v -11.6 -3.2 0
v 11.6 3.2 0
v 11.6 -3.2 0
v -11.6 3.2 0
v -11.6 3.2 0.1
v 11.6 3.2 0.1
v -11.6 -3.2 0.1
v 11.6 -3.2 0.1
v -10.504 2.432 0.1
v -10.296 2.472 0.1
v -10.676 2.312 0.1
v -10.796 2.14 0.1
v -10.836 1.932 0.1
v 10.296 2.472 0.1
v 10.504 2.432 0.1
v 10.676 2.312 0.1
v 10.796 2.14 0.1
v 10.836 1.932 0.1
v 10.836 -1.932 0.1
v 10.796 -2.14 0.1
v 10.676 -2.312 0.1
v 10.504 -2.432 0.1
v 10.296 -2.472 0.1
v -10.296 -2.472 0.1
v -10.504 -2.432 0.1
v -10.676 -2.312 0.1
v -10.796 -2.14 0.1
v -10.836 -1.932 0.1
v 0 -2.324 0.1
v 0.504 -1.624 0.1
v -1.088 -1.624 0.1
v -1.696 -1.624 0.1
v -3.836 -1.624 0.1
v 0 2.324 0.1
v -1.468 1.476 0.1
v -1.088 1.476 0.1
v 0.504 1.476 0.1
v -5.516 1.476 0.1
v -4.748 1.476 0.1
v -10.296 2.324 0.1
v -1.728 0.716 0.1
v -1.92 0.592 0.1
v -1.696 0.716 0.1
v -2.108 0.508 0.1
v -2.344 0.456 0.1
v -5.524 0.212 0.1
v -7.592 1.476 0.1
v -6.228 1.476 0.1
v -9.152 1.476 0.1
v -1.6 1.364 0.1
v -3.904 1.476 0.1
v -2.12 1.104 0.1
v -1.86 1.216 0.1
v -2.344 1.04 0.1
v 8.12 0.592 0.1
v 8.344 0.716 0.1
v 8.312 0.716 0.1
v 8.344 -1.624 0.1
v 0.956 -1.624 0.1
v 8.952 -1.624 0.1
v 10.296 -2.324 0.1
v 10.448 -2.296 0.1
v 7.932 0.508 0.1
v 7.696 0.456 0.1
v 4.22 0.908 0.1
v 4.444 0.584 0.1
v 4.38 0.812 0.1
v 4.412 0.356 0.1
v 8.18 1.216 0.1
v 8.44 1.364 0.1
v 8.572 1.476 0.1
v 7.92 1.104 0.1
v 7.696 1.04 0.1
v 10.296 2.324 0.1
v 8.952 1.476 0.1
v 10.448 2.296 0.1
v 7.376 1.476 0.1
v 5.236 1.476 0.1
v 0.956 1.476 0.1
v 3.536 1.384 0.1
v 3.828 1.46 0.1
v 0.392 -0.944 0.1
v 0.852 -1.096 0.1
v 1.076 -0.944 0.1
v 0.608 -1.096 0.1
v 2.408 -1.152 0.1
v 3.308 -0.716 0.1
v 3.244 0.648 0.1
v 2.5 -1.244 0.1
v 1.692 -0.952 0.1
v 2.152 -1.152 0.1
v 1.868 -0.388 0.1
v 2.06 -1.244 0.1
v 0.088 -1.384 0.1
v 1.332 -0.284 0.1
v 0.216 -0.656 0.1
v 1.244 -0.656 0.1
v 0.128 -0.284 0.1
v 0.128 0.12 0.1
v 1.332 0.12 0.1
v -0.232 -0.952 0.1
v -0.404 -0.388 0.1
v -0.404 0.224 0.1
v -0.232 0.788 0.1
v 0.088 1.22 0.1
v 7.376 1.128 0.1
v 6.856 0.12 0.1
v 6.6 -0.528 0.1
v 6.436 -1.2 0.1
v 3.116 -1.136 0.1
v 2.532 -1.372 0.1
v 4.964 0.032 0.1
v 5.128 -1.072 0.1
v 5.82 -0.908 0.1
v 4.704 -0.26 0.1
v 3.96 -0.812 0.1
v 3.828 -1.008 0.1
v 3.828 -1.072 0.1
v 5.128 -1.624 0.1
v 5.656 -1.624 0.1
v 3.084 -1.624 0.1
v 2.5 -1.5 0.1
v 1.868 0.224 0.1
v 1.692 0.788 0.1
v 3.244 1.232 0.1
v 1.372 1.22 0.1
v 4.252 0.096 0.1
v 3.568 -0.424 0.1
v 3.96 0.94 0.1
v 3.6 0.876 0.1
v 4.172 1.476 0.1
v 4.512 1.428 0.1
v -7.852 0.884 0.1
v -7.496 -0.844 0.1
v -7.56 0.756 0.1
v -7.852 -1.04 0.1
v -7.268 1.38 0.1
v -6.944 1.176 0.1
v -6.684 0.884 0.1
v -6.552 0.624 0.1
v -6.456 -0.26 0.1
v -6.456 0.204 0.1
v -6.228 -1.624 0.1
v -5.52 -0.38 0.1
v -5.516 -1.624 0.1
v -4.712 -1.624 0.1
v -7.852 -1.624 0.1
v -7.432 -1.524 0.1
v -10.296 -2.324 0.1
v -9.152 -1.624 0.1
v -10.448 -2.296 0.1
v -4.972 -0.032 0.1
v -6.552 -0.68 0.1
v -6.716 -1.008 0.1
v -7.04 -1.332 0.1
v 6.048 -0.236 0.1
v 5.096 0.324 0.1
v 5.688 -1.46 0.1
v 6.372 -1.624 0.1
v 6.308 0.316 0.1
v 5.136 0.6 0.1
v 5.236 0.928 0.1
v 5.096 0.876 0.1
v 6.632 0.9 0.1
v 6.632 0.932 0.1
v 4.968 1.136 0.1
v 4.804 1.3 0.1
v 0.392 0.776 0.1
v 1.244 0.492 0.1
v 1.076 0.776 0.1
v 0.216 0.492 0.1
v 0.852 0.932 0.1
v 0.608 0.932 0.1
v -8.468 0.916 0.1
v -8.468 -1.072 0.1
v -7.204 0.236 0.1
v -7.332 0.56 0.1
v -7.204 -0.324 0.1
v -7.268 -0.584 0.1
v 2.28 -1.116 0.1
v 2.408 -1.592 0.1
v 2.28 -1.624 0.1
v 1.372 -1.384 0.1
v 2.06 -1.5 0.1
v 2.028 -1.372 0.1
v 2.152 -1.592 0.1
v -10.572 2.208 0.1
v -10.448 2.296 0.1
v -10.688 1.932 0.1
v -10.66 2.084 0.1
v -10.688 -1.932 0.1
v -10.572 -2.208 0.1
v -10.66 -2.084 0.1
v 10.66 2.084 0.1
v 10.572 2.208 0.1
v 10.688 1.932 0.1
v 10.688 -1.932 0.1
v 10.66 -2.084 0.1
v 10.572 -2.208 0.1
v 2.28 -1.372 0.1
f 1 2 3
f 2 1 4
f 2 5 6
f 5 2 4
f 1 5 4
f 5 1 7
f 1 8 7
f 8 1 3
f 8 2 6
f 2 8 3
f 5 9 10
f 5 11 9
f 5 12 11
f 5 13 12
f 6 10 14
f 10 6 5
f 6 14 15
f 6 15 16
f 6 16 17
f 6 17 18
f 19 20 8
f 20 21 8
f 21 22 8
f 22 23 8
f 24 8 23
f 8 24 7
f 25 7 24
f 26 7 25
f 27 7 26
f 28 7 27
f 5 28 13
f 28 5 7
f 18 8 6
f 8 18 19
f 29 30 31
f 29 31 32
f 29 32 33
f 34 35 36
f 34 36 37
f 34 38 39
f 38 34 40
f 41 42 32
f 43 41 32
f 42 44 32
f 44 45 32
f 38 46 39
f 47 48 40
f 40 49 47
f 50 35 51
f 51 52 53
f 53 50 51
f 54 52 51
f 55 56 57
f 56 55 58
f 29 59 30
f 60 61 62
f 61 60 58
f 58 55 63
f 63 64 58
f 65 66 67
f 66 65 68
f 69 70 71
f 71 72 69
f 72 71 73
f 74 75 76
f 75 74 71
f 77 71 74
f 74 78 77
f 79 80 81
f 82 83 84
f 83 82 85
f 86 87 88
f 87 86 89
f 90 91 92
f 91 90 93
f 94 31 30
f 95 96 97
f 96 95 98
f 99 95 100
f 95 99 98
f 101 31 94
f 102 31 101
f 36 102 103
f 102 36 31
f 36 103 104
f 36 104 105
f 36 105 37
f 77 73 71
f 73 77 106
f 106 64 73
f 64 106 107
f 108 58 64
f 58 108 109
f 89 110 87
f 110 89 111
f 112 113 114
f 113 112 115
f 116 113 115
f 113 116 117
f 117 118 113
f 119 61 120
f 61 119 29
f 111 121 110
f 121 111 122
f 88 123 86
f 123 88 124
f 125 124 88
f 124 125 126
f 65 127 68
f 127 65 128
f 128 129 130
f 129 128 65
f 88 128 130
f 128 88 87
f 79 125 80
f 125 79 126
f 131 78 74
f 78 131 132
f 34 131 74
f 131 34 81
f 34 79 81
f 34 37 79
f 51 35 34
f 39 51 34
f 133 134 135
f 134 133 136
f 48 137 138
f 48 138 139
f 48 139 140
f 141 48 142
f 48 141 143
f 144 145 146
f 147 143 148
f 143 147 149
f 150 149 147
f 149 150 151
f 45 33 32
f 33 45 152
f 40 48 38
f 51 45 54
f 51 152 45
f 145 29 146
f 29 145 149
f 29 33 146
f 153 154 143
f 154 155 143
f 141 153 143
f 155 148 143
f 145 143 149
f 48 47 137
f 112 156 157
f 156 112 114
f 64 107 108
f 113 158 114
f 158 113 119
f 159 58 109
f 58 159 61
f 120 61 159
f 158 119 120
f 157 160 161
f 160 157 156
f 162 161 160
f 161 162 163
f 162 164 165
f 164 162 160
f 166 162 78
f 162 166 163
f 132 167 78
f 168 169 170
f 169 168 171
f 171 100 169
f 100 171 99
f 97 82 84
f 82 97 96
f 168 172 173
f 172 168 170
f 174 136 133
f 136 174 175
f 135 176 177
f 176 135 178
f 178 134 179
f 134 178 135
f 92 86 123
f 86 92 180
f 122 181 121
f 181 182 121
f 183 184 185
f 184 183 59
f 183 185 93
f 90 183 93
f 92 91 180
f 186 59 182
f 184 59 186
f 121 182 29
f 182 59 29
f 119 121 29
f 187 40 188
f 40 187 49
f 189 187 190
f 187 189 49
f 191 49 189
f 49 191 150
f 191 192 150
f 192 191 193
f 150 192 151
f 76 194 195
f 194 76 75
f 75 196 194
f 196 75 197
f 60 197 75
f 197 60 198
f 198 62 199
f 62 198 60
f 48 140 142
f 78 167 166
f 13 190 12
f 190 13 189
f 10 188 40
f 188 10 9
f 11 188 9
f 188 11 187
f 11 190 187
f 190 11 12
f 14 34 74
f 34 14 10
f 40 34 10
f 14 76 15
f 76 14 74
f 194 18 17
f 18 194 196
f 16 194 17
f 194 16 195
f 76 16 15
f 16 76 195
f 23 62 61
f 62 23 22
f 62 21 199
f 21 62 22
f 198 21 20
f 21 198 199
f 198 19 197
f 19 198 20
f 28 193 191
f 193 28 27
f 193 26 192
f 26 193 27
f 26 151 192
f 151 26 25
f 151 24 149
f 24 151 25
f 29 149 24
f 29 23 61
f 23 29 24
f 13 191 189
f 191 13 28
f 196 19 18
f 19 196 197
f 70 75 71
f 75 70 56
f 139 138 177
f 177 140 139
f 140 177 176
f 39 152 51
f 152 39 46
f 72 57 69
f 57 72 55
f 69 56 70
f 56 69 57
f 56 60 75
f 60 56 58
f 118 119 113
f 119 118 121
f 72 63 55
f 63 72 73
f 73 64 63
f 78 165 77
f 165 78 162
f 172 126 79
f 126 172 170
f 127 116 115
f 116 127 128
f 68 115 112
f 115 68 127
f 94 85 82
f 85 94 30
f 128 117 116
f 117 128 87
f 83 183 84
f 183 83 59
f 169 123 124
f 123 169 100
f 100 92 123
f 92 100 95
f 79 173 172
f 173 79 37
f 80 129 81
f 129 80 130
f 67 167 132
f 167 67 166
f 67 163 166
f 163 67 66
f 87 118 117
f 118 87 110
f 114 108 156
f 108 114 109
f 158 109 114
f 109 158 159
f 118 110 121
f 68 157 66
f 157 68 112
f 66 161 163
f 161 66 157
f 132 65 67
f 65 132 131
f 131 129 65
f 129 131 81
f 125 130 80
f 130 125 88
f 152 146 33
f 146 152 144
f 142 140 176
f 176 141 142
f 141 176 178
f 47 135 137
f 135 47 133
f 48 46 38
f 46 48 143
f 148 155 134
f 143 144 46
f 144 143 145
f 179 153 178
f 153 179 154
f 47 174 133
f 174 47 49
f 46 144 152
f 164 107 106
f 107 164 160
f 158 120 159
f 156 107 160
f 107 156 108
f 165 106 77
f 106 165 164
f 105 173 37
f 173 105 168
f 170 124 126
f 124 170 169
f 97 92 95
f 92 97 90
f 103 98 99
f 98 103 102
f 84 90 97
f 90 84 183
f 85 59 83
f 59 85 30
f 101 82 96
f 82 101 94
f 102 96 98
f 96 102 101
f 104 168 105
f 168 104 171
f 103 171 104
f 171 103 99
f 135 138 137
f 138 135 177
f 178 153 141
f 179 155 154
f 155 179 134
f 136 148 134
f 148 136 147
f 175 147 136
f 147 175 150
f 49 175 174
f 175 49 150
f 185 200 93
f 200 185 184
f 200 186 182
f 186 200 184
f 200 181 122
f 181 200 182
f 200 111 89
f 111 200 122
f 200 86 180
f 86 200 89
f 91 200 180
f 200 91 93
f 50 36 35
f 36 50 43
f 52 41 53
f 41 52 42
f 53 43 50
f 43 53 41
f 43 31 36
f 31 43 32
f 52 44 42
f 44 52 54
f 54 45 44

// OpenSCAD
// file: ../p/box5-12.scad
use <../lib.scad>
function ldraw_lib__box5_12() = [
// 0 Box with 5 Faces without Any Edges
// 0 Name: box5-12.dat
// 0 Author: Chris Dee [cwdee]
// 0 !LDRAW_ORG Primitive UPDATE 2009-02
// 0 !LICENSE Licensed under CC BY 2.0 and CC BY 4.0 : see CAreadme.txt
// 
// 0 BFC CERTIFY CCW
  [0,"BFC","CERTIFY"],
  [0,"BFC","CCW"],
// 
// 0 !HISTORY 2009-09-03 [PTadmin] Official Update 2009-02
// 
// 
// 4 16 1 1 1 1 1 -1 -1 1 -1 -1 1 1
  [4,16,1,1,1,1,1,-1,-1,1,-1,-1,1,1],
// 4 16 -1 0 1 1 0 1 1 1 1 -1 1 1
  [4,16,-1,0,1,1,0,1,1,1,1,-1,1,1],
// 4 16 -1 0 -1 -1 0 1 -1 1 1 -1 1 -1
  [4,16,-1,0,-1,-1,0,1,-1,1,1,-1,1,-1],
// 4 16 1 0 -1 -1 0 -1 -1 1 -1 1 1 -1
  [4,16,1,0,-1,-1,0,-1,-1,1,-1,1,1,-1],
// 4 16 1 0 1 1 0 -1 1 1 -1 1 1 1
  [4,16,1,0,1,1,0,-1,1,1,-1,1,1,1],
// 0
];
makepoly(ldraw_lib__box5_12(), line=0.2);
// main file
use <../lib.scad>
use <../p/box5-12.scad>
function ldraw_lib__6296256j() = [
// 0 Sticker  0.8 x  2.9 with "DK 10.271" Licence Plate
// 0 Name: 6296256j.dat
// 0 Author: Magnus Forsberg [MagFors]
// 0 !LDRAW_ORG Part UPDATE 2020-03
// 0 !LICENSE Licensed under CC BY 2.0 and CC BY 4.0 : see CAreadme.txt
// 
// 0 BFC CERTIFY CCW
  [0,"BFC","CERTIFY"],
  [0,"BFC","CCW"],
// 
// 0 !KEYWORDS 500, Cinquecento, FIAT, Nuova, set 10271
// 
// 0 !HISTORY 2020-12-29 [PTadmin] Official Update 2020-03
// 
// 
// 1 16 0 -.25 0 29 0 0 0 .25 0 0 0 8 box5-12.dat
  [1,16,0,-.25,0,29,0,0,0,.25,0,0,0,8, ldraw_lib__box5_12()],
// 3 0 -29 -.25 8 -26.26 -.25 6.08 -25.74 -.25 6.18
  [3,0,-29,-.25,8,-26.26,-.25,6.08,-25.74,-.25,6.18],
// 3 0 -29 -.25 8 -26.69 -.25 5.78 -26.26 -.25 6.08
  [3,0,-29,-.25,8,-26.69,-.25,5.78,-26.26,-.25,6.08],
// 3 0 -29 -.25 8 -26.99 -.25 5.35 -26.69 -.25 5.78
  [3,0,-29,-.25,8,-26.99,-.25,5.35,-26.69,-.25,5.78],
// 3 0 -29 -.25 8 -27.09 -.25 4.83 -26.99 -.25 5.35
  [3,0,-29,-.25,8,-27.09,-.25,4.83,-26.99,-.25,5.35],
// 4 0 25.74 -.25 6.18 29 -.25 8 -29 -.25 8 -25.74 -.25 6.18
  [4,0,25.74,-.25,6.18,29,-.25,8,-29,-.25,8,-25.74,-.25,6.18],
// 3 0 29 -.25 8 25.74 -.25 6.18 26.26 -.25 6.08
  [3,0,29,-.25,8,25.74,-.25,6.18,26.26,-.25,6.08],
// 3 0 29 -.25 8 26.26 -.25 6.08 26.69 -.25 5.78
  [3,0,29,-.25,8,26.26,-.25,6.08,26.69,-.25,5.78],
// 3 0 29 -.25 8 26.69 -.25 5.78 26.99 -.25 5.35
  [3,0,29,-.25,8,26.69,-.25,5.78,26.99,-.25,5.35],
// 3 0 29 -.25 8 26.99 -.25 5.35 27.09 -.25 4.83
  [3,0,29,-.25,8,26.99,-.25,5.35,27.09,-.25,4.83],
// 3 0 27.09 -.25 -4.83 26.99 -.25 -5.35 29 -.25 -8
  [3,0,27.09,-.25,-4.83,26.99,-.25,-5.35,29,-.25,-8],
// 3 0 26.99 -.25 -5.35 26.69 -.25 -5.78 29 -.25 -8
  [3,0,26.99,-.25,-5.35,26.69,-.25,-5.78,29,-.25,-8],
// 3 0 26.69 -.25 -5.78 26.26 -.25 -6.08 29 -.25 -8
  [3,0,26.69,-.25,-5.78,26.26,-.25,-6.08,29,-.25,-8],
// 3 0 26.26 -.25 -6.08 25.74 -.25 -6.18 29 -.25 -8
  [3,0,26.26,-.25,-6.08,25.74,-.25,-6.18,29,-.25,-8],
// 4 0 -29 -.25 -8 29 -.25 -8 25.74 -.25 -6.18 -25.74 -.25 -6.18
  [4,0,-29,-.25,-8,29,-.25,-8,25.74,-.25,-6.18,-25.74,-.25,-6.18],
// 3 0 -26.26 -.25 -6.08 -29 -.25 -8 -25.74 -.25 -6.18
  [3,0,-26.26,-.25,-6.08,-29,-.25,-8,-25.74,-.25,-6.18],
// 3 0 -26.69 -.25 -5.78 -29 -.25 -8 -26.26 -.25 -6.08
  [3,0,-26.69,-.25,-5.78,-29,-.25,-8,-26.26,-.25,-6.08],
// 3 0 -26.99 -.25 -5.35 -29 -.25 -8 -26.69 -.25 -5.78
  [3,0,-26.99,-.25,-5.35,-29,-.25,-8,-26.69,-.25,-5.78],
// 3 0 -27.09 -.25 -4.83 -29 -.25 -8 -26.99 -.25 -5.35
  [3,0,-27.09,-.25,-4.83,-29,-.25,-8,-26.99,-.25,-5.35],
// 4 0 -27.09 -.25 -4.83 -27.09 -.25 4.83 -29 -.25 8 -29 -.25 -8
  [4,0,-27.09,-.25,-4.83,-27.09,-.25,4.83,-29,-.25,8,-29,-.25,-8],
// 4 0 27.09 -.25 4.83 27.09 -.25 -4.83 29 -.25 -8 29 -.25 8
  [4,0,27.09,-.25,4.83,27.09,-.25,-4.83,29,-.25,-8,29,-.25,8],
// 3 0 0 -.25 -5.81 1.26 -.25 -4.06 -2.72 -.25 -4.06
  [3,0,0,-.25,-5.81,1.26,-.25,-4.06,-2.72,-.25,-4.06],
// 3 0 0 -.25 -5.81 -2.72 -.25 -4.06 -4.24 -.25 -4.06
  [3,0,0,-.25,-5.81,-2.72,-.25,-4.06,-4.24,-.25,-4.06],
// 3 0 0 -.25 -5.81 -4.24 -.25 -4.06 -9.59 -.25 -4.06
  [3,0,0,-.25,-5.81,-4.24,-.25,-4.06,-9.59,-.25,-4.06],
// 3 0 0 -.25 5.81 -3.67 -.25 3.69 -2.72 -.25 3.69
  [3,0,0,-.25,5.81,-3.67,-.25,3.69,-2.72,-.25,3.69],
// 3 0 0 -.25 5.81 -2.72 -.25 3.69 1.26 -.25 3.69
  [3,0,0,-.25,5.81,-2.72,-.25,3.69,1.26,-.25,3.69],
// 4 0 -13.79 -.25 3.69 -11.87 -.25 3.69 0 -.25 5.81 -25.74 -.25 5.81
  [4,0,-13.79,-.25,3.69,-11.87,-.25,3.69,0,-.25,5.81,-25.74,-.25,5.81],
// 3 0 -4.32 -.25 1.79 -4.8 -.25 1.48 -4.24 -.25 -4.06
  [3,0,-4.32,-.25,1.79,-4.8,-.25,1.48,-4.24,-.25,-4.06],
// 3 0 -4.24 -.25 1.79 -4.32 -.25 1.79 -4.24 -.25 -4.06
  [3,0,-4.24,-.25,1.79,-4.32,-.25,1.79,-4.24,-.25,-4.06],
// 3 0 -4.8 -.25 1.48 -5.27 -.25 1.27 -4.24 -.25 -4.06
  [3,0,-4.8,-.25,1.48,-5.27,-.25,1.27,-4.24,-.25,-4.06],
// 3 0 -5.27 -.25 1.27 -5.86 -.25 1.14 -4.24 -.25 -4.06
  [3,0,-5.27,-.25,1.27,-5.86,-.25,1.14,-4.24,-.25,-4.06],
// 3 0 -13.79 -.25 3.69 -13.81 -.25 .53 -11.87 -.25 3.69
  [3,0,-13.79,-.25,3.69,-13.81,-.25,.53,-11.87,-.25,3.69],
// 3 0 -18.98 -.25 3.69 -15.57 -.25 3.69 -25.74 -.25 5.81
  [3,0,-18.98,-.25,3.69,-15.57,-.25,3.69,-25.74,-.25,5.81],
// 3 0 -25.74 -.25 5.81 -22.88 -.25 3.69 -18.98 -.25 3.69
  [3,0,-25.74,-.25,5.81,-22.88,-.25,3.69,-18.98,-.25,3.69],
// 3 0 -4 -.25 3.41 -3.67 -.25 3.69 -9.76 -.25 3.69
  [3,0,-4,-.25,3.41,-3.67,-.25,3.69,-9.76,-.25,3.69],
// 3 0 -9.76 -.25 3.69 -5.3 -.25 2.76 -4.65 -.25 3.04
  [3,0,-9.76,-.25,3.69,-5.3,-.25,2.76,-4.65,-.25,3.04],
// 3 0 -4.65 -.25 3.04 -4 -.25 3.41 -9.76 -.25 3.69
  [3,0,-4.65,-.25,3.04,-4,-.25,3.41,-9.76,-.25,3.69],
// 3 0 -5.86 -.25 2.6 -5.3 -.25 2.76 -9.76 -.25 3.69
  [3,0,-5.86,-.25,2.6,-5.3,-.25,2.76,-9.76,-.25,3.69],
// 4 0 20.3 -.25 1.48 20.86 -.25 -4.06 20.86 -.25 1.79 20.78 -.25 1.79
  [4,0,20.3,-.25,1.48,20.86,-.25,-4.06,20.86,-.25,1.79,20.78,-.25,1.79],
// 3 0 0 -.25 -5.81 2.39 -.25 -4.06 1.26 -.25 -4.06
  [3,0,0,-.25,-5.81,2.39,-.25,-4.06,1.26,-.25,-4.06],
// 4 0 22.38 -.25 -4.06 20.86 -.25 -4.06 25.74 -.25 -5.81 26.12 -.25 -5.74
  [4,0,22.38,-.25,-4.06,20.86,-.25,-4.06,25.74,-.25,-5.81,26.12,-.25,-5.74],
// 3 0 20.86 -.25 -4.06 20.3 -.25 1.48 19.83 -.25 1.27
  [3,0,20.86,-.25,-4.06,20.3,-.25,1.48,19.83,-.25,1.27],
// 3 0 19.83 -.25 1.27 19.24 -.25 1.14 20.86 -.25 -4.06
  [3,0,19.83,-.25,1.27,19.24,-.25,1.14,20.86,-.25,-4.06],
// 4 0 11.11 -.25 1.46 10.95 -.25 2.03 10.55 -.25 2.27 11.03 -.25 .89
  [4,0,11.11,-.25,1.46,10.95,-.25,2.03,10.55,-.25,2.27,11.03,-.25,.89],
// 3 0 20.45 -.25 3.04 21.1 -.25 3.41 21.43 -.25 3.69
  [3,0,20.45,-.25,3.04,21.1,-.25,3.41,21.43,-.25,3.69],
// 4 0 21.43 -.25 3.69 19.24 -.25 2.6 19.8 -.25 2.76 20.45 -.25 3.04
  [4,0,21.43,-.25,3.69,19.24,-.25,2.6,19.8,-.25,2.76,20.45,-.25,3.04],
// 4 0 25.74 -.25 5.81 21.43 -.25 3.69 22.38 -.25 3.69 26.12 -.25 5.74
  [4,0,25.74,-.25,5.81,21.43,-.25,3.69,22.38,-.25,3.69,26.12,-.25,5.74],
// 3 0 18.44 -.25 3.69 21.43 -.25 3.69 25.74 -.25 5.81
  [3,0,18.44,-.25,3.69,21.43,-.25,3.69,25.74,-.25,5.81],
// 3 0 25.74 -.25 5.81 13.09 -.25 3.69 18.44 -.25 3.69
  [3,0,25.74,-.25,5.81,13.09,-.25,3.69,18.44,-.25,3.69],
// 3 0 2.39 -.25 3.69 8.84 -.25 3.46 9.57 -.25 3.65
  [3,0,2.39,-.25,3.69,8.84,-.25,3.46,9.57,-.25,3.65],
// 4 0 1.52 -.25 -2.74 2.13 -.25 -2.74 2.69 -.25 -2.36 .98 -.25 -2.36
  [4,0,1.52,-.25,-2.74,2.13,-.25,-2.74,2.69,-.25,-2.36,.98,-.25,-2.36],
// 4 0 8.27 -.25 -1.79 8.11 -.25 1.62 6.02 -.25 -2.88 6.25 -.25 -3.11
  [4,0,8.27,-.25,-1.79,8.11,-.25,1.62,6.02,-.25,-2.88,6.25,-.25,-3.11],
// 4 0 5.38 -.25 -2.88 4.67 -.25 -.97 4.23 -.25 -2.38 5.15 -.25 -3.11
  [4,0,5.38,-.25,-2.88,4.67,-.25,-.97,4.23,-.25,-2.38,5.15,-.25,-3.11],
// 3 0 .22 -.25 -3.46 -2.72 -.25 -4.06 1.26 -.25 -4.06
  [3,0,.22,-.25,-3.46,-2.72,-.25,-4.06,1.26,-.25,-4.06],
// 4 0 3.11 -.25 -1.64 3.33 -.25 -.71 .32 -.25 -.71 .54 -.25 -1.64
  [4,0,3.11,-.25,-1.64,3.33,-.25,-.71,.32,-.25,-.71,.54,-.25,-1.64],
// 4 0 .32 -.25 .3 .32 -.25 -.71 3.33 -.25 -.71 3.33 -.25 .3
  [4,0,.32,-.25,.3,.32,-.25,-.71,3.33,-.25,-.71,3.33,-.25,.3],
// 3 0 -.58 -.25 -2.38 -2.72 -.25 -4.06 .22 -.25 -3.46
  [3,0,-.58,-.25,-2.38,-2.72,-.25,-4.06,.22,-.25,-3.46],
// 3 0 -1.01 -.25 -.97 -2.72 -.25 -4.06 -.58 -.25 -2.38
  [3,0,-1.01,-.25,-.97,-2.72,-.25,-4.06,-.58,-.25,-2.38],
// 4 0 -1.01 -.25 .56 -2.72 -.25 3.69 -2.72 -.25 -4.06 -1.01 -.25 -.97
  [4,0,-1.01,-.25,.56,-2.72,-.25,3.69,-2.72,-.25,-4.06,-1.01,-.25,-.97],
// 3 0 -2.72 -.25 3.69 -1.01 -.25 .56 -.58 -.25 1.97
  [3,0,-2.72,-.25,3.69,-1.01,-.25,.56,-.58,-.25,1.97],
// 3 0 -2.72 -.25 3.69 -.58 -.25 1.97 .22 -.25 3.05
  [3,0,-2.72,-.25,3.69,-.58,-.25,1.97,.22,-.25,3.05],
// 3 0 -2.72 -.25 3.69 .22 -.25 3.05 1.26 -.25 3.69
  [3,0,-2.72,-.25,3.69,.22,-.25,3.05,1.26,-.25,3.69],
// 4 0 18.44 -.25 3.69 18.44 -.25 2.82 19.24 -.25 2.6 21.43 -.25 3.69
  [4,0,18.44,-.25,3.69,18.44,-.25,2.82,19.24,-.25,2.6,21.43,-.25,3.69],
// 4 0 18.44 -.25 2.82 17.14 -.25 .3 19.24 -.25 1.14 19.24 -.25 2.6
  [4,0,18.44,-.25,2.82,17.14,-.25,.3,19.24,-.25,1.14,19.24,-.25,2.6],
// 4 0 16.5 -.25 -1.32 16.09 -.25 -3 20.86 -.25 -4.06 19.24 -.25 1.14
  [4,0,16.5,-.25,-1.32,16.09,-.25,-3,20.86,-.25,-4.06,19.24,-.25,1.14],
// 4 0 7.79 -.25 -2.84 8.27 -.25 -1.79 6.25 -.25 -3.11 6.33 -.25 -3.43
  [4,0,7.79,-.25,-2.84,8.27,-.25,-1.79,6.25,-.25,-3.11,6.33,-.25,-3.43],
// 4 0 12.41 -.25 .08 11.76 -.25 -.65 12.82 -.25 -2.68 14.55 -.25 -2.27
  [4,0,12.41,-.25,.08,11.76,-.25,-.65,12.82,-.25,-2.68,14.55,-.25,-2.27],
// 4 0 12.82 -.25 -2.68 11.76 -.25 -.65 9.9 -.25 -2.03 9.57 -.25 -2.52
  [4,0,12.82,-.25,-2.68,11.76,-.25,-.65,9.9,-.25,-2.03,9.57,-.25,-2.52],
// 3 0 9.57 -.25 -2.52 9.57 -.25 -2.68 12.82 -.25 -2.68
  [3,0,9.57,-.25,-2.52,9.57,-.25,-2.68,12.82,-.25,-2.68],
// 4 0 0 -.25 -5.81 25.74 -.25 -5.81 14.14 -.25 -4.06 12.82 -.25 -4.06
  [4,0,0,-.25,-5.81,25.74,-.25,-5.81,14.14,-.25,-4.06,12.82,-.25,-4.06],
// 4 0 7.79 -.25 -2.84 6.33 -.25 -3.43 6.25 -.25 -3.75 7.71 -.25 -4.06
  [4,0,7.79,-.25,-2.84,6.33,-.25,-3.43,6.25,-.25,-3.75,7.71,-.25,-4.06],
// 4 0 4.67 -.25 .56 6.02 -.25 -2.88 8.11 -.25 1.62 4.23 -.25 1.97
  [4,0,4.67,-.25,.56,6.02,-.25,-2.88,8.11,-.25,1.62,4.23,-.25,1.97],
// 4 0 3.43 -.25 3.05 4.23 -.25 1.97 8.11 -.25 1.62 8.11 -.25 3.08
  [4,0,3.43,-.25,3.05,4.23,-.25,1.97,8.11,-.25,1.62,8.11,-.25,3.08],
// 4 0 10.55 -.25 2.27 8.92 -.25 -1.06 10.63 -.25 .24 11.03 -.25 .89
  [4,0,10.55,-.25,2.27,8.92,-.25,-1.06,10.63,-.25,.24,11.03,-.25,.89],
// 4 0 10.55 -.25 2.27 9.9 -.25 2.35 9 -.25 2.19 8.92 -.25 -1.06
  [4,0,10.55,-.25,2.27,9.9,-.25,2.35,9,-.25,2.19,8.92,-.25,-1.06],
// 4 0 8.27 -.25 -1.79 8.92 -.25 -1.06 9 -.25 2.19 8.11 -.25 1.62
  [4,0,8.27,-.25,-1.79,8.92,-.25,-1.06,9,-.25,2.19,8.11,-.25,1.62],
// 4 0 2.39 -.25 3.69 3.43 -.25 3.05 8.11 -.25 3.08 8.84 -.25 3.46
  [4,0,2.39,-.25,3.69,3.43,-.25,3.05,8.11,-.25,3.08,8.84,-.25,3.46],
// 4 0 11.28 -.25 3.57 13.09 -.25 3.69 25.74 -.25 5.81 10.43 -.25 3.69
  [4,0,11.28,-.25,3.57,13.09,-.25,3.69,25.74,-.25,5.81,10.43,-.25,3.69],
// 4 0 10.43 -.25 3.69 25.74 -.25 5.81 0 -.25 5.81 9.57 -.25 3.65
  [4,0,10.43,-.25,3.69,25.74,-.25,5.81,0,-.25,5.81,9.57,-.25,3.65],
// 3 0 0 -.25 5.81 2.39 -.25 3.69 9.57 -.25 3.65
  [3,0,0,-.25,5.81,2.39,-.25,3.69,9.57,-.25,3.65],
// 3 0 0 -.25 5.81 1.26 -.25 3.69 2.39 -.25 3.69
  [3,0,0,-.25,5.81,1.26,-.25,3.69,2.39,-.25,3.69],
// 3 0 -9.76 -.25 3.69 -3.67 -.25 3.69 0 -.25 5.81
  [3,0,-9.76,-.25,3.69,-3.67,-.25,3.69,0,-.25,5.81],
// 3 0 -11.87 -.25 3.69 -9.76 -.25 3.69 0 -.25 5.81
  [3,0,-11.87,-.25,3.69,-9.76,-.25,3.69,0,-.25,5.81],
// 4 0 -18.74 -.25 -2.11 -18.9 -.25 1.89 -19.63 -.25 2.21 -19.63 -.25 -2.6
  [4,0,-18.74,-.25,-2.11,-18.9,-.25,1.89,-19.63,-.25,2.21,-19.63,-.25,-2.6],
// 3 0 -15.57 -.25 3.69 -18.17 -.25 3.45 -17.36 -.25 2.94
  [3,0,-15.57,-.25,3.69,-18.17,-.25,3.45,-17.36,-.25,2.94],
// 3 0 -15.57 -.25 3.69 -17.36 -.25 2.94 -16.71 -.25 2.21
  [3,0,-15.57,-.25,3.69,-17.36,-.25,2.94,-16.71,-.25,2.21],
// 3 0 -15.57 -.25 3.69 -16.71 -.25 2.21 -16.38 -.25 1.56
  [3,0,-15.57,-.25,3.69,-16.71,-.25,2.21,-16.38,-.25,1.56],
// 4 0 -16.14 -.25 .51 -16.14 -.25 -.65 -15.57 -.25 -4.06 -15.57 -.25 3.69
  [4,0,-16.14,-.25,.51,-16.14,-.25,-.65,-15.57,-.25,-4.06,-15.57,-.25,3.69],
// 3 0 -13.8 -.25 -.95 -13.79 -.25 -4.06 -11.78 -.25 -4.06
  [3,0,-13.8,-.25,-.95,-13.79,-.25,-4.06,-11.78,-.25,-4.06],
// 4 0 -15.57 -.25 -4.06 -18.58 -.25 -3.81 -19.63 -.25 -4.06 -25.74 -.25 -5.81
  [4,0,-15.57,-.25,-4.06,-18.58,-.25,-3.81,-19.63,-.25,-4.06,-25.74,-.25,-5.81],
// 4 0 -25.74 -.25 -5.81 -19.63 -.25 -4.06 -22.88 -.25 -4.06 -26.12 -.25 -5.74
  [4,0,-25.74,-.25,-5.81,-19.63,-.25,-4.06,-22.88,-.25,-4.06,-26.12,-.25,-5.74],
// 4 0 -4.24 -.25 -4.06 -5.86 -.25 1.14 -12.43 -.25 -.08 -9.59 -.25 -4.06
  [4,0,-4.24,-.25,-4.06,-5.86,-.25,1.14,-12.43,-.25,-.08,-9.59,-.25,-4.06],
// 3 0 -25.74 -.25 5.81 -15.57 -.25 3.69 -13.79 -.25 3.69
  [3,0,-25.74,-.25,5.81,-15.57,-.25,3.69,-13.79,-.25,3.69],
// 3 0 -9.76 -.25 3.69 -5.86 -.25 1.14 -5.86 -.25 2.6
  [3,0,-9.76,-.25,3.69,-5.86,-.25,1.14,-5.86,-.25,2.6],
// 3 0 -9.76 -.25 3.69 -12.43 -.25 -.08 -5.86 -.25 1.14
  [3,0,-9.76,-.25,3.69,-12.43,-.25,-.08,-5.86,-.25,1.14],
// 4 0 -13.79 -.25 -4.06 -25.74 -.25 -5.81 0 -.25 -5.81 -11.78 -.25 -4.06
  [4,0,-13.79,-.25,-4.06,-25.74,-.25,-5.81,0,-.25,-5.81,-11.78,-.25,-4.06],
// 3 0 0 -.25 -5.81 -9.59 -.25 -4.06 -11.78 -.25 -4.06
  [3,0,0,-.25,-5.81,-9.59,-.25,-4.06,-11.78,-.25,-4.06],
// 3 0 -16.38 -.25 -1.7 -16.79 -.25 -2.52 -15.57 -.25 -4.06
  [3,0,-16.38,-.25,-1.7,-16.79,-.25,-2.52,-15.57,-.25,-4.06],
// 3 0 -16.79 -.25 -2.52 -17.6 -.25 -3.33 -15.57 -.25 -4.06
  [3,0,-16.79,-.25,-2.52,-17.6,-.25,-3.33,-15.57,-.25,-4.06],
// 3 0 -16.14 -.25 -.65 -16.38 -.25 -1.7 -15.57 -.25 -4.06
  [3,0,-16.14,-.25,-.65,-16.38,-.25,-1.7,-15.57,-.25,-4.06],
// 3 0 -17.6 -.25 -3.33 -18.58 -.25 -3.81 -15.57 -.25 -4.06
  [3,0,-17.6,-.25,-3.33,-18.58,-.25,-3.81,-15.57,-.25,-4.06],
// 3 0 -13.79 -.25 -4.06 -15.57 -.25 -4.06 -25.74 -.25 -5.81
  [3,0,-13.79,-.25,-4.06,-15.57,-.25,-4.06,-25.74,-.25,-5.81],
// 3 0 -15.57 -.25 3.69 -18.98 -.25 3.69 -18.17 -.25 3.45
  [3,0,-15.57,-.25,3.69,-18.98,-.25,3.69,-18.17,-.25,3.45],
// 4 0 12.41 -.25 .08 14.55 -.25 -2.27 15.12 -.25 -.59 12.74 -.25 .81
  [4,0,12.41,-.25,.08,14.55,-.25,-2.27,15.12,-.25,-.59,12.74,-.25,.81],
// 3 0 19.24 -.25 1.14 17.14 -.25 .3 16.5 -.25 -1.32
  [3,0,19.24,-.25,1.14,17.14,-.25,.3,16.5,-.25,-1.32],
// 4 0 14.22 -.25 -3.65 14.55 -.25 -2.27 12.82 -.25 -2.68 12.82 -.25 -4.06
  [4,0,14.22,-.25,-3.65,14.55,-.25,-2.27,12.82,-.25,-2.68,12.82,-.25,-4.06],
// 4 0 20.86 -.25 -4.06 16.09 -.25 -3 15.93 -.25 -4.06 25.74 -.25 -5.81
  [4,0,20.86,-.25,-4.06,16.09,-.25,-3,15.93,-.25,-4.06,25.74,-.25,-5.81],
// 3 0 14.14 -.25 -4.06 25.74 -.25 -5.81 15.93 -.25 -4.06
  [3,0,14.14,-.25,-4.06,25.74,-.25,-5.81,15.93,-.25,-4.06],
// 3 0 14.22 -.25 -3.65 12.82 -.25 -4.06 14.14 -.25 -4.06
  [3,0,14.22,-.25,-3.65,12.82,-.25,-4.06,14.14,-.25,-4.06],
// 4 0 15.77 -.25 .79 12.84 -.25 1.5 12.74 -.25 .81 15.12 -.25 -.59
  [4,0,15.77,-.25,.79,12.84,-.25,1.5,12.74,-.25,.81,15.12,-.25,-.59],
// 4 0 13.09 -.25 2.32 12.74 -.25 2.19 12.84 -.25 1.5 15.77 -.25 .79
  [4,0,13.09,-.25,2.32,12.74,-.25,2.19,12.84,-.25,1.5,15.77,-.25,.79],
// 4 0 16.58 -.25 2.25 16.58 -.25 2.33 13.09 -.25 2.32 15.77 -.25 .79
  [4,0,16.58,-.25,2.25,16.58,-.25,2.33,13.09,-.25,2.32,15.77,-.25,.79],
// 4 0 12.42 -.25 2.84 12.74 -.25 2.19 13.09 -.25 2.32 13.09 -.25 3.69
  [4,0,12.42,-.25,2.84,12.74,-.25,2.19,13.09,-.25,2.32,13.09,-.25,3.69],
// 3 0 11.28 -.25 3.57 12.01 -.25 3.25 13.09 -.25 3.69
  [3,0,11.28,-.25,3.57,12.01,-.25,3.25,13.09,-.25,3.69],
// 4 0 .98 -.25 1.94 .54 -.25 1.23 3.11 -.25 1.23 2.69 -.25 1.94
  [4,0,.98,-.25,1.94,.54,-.25,1.23,3.11,-.25,1.23,2.69,-.25,1.94],
// 4 0 3.33 -.25 .3 3.11 -.25 1.23 .54 -.25 1.23 .32 -.25 .3
  [4,0,3.33,-.25,.3,3.11,-.25,1.23,.54,-.25,1.23,.32,-.25,.3],
// 4 0 3.11 -.25 -1.64 .54 -.25 -1.64 .98 -.25 -2.36 2.69 -.25 -2.36
  [4,0,3.11,-.25,-1.64,.54,-.25,-1.64,.98,-.25,-2.36,2.69,-.25,-2.36],
// 4 0 .98 -.25 1.94 2.69 -.25 1.94 2.13 -.25 2.33 1.52 -.25 2.33
  [4,0,.98,-.25,1.94,2.69,-.25,1.94,2.13,-.25,2.33,1.52,-.25,2.33],
// 4 0 -21.17 -.25 -2.68 -19.63 -.25 -2.6 -19.63 -.25 2.21 -21.17 -.25 2.29
  [4,0,-21.17,-.25,-2.68,-19.63,-.25,-2.6,-19.63,-.25,2.21,-21.17,-.25,2.29],
// 4 0 -18.01 -.25 .59 -18.33 -.25 1.4 -18.9 -.25 1.89 -18.01 -.25 -.81
  [4,0,-18.01,-.25,.59,-18.33,-.25,1.4,-18.9,-.25,1.89,-18.01,-.25,-.81],
// 4 0 -18.74 -.25 -2.11 -18.17 -.25 -1.46 -18.01 -.25 -.81 -18.9 -.25 1.89
  [4,0,-18.74,-.25,-2.11,-18.17,-.25,-1.46,-18.01,-.25,-.81,-18.9,-.25,1.89],
// 4 0 6.02 -.25 -2.88 4.67 -.25 .56 4.67 -.25 -.97 5.7 -.25 -2.79
  [4,0,6.02,-.25,-2.88,4.67,-.25,.56,4.67,-.25,-.97,5.7,-.25,-2.79],
// 3 0 6.25 -.25 -3.75 6.02 -.25 -3.98 7.71 -.25 -4.06
  [3,0,6.25,-.25,-3.75,6.02,-.25,-3.98,7.71,-.25,-4.06],
// 3 0 6.02 -.25 -3.98 5.7 -.25 -4.06 7.71 -.25 -4.06
  [3,0,6.02,-.25,-3.98,5.7,-.25,-4.06,7.71,-.25,-4.06],
// 4 0 3.43 -.25 -3.46 2.39 -.25 -4.06 5.15 -.25 -3.75 5.07 -.25 -3.43
  [4,0,3.43,-.25,-3.46,2.39,-.25,-4.06,5.15,-.25,-3.75,5.07,-.25,-3.43],
// 3 0 3.43 -.25 -3.46 5.07 -.25 -3.43 5.15 -.25 -3.11
  [3,0,3.43,-.25,-3.46,5.07,-.25,-3.43,5.15,-.25,-3.11],
// 3 0 4.23 -.25 -2.38 3.43 -.25 -3.46 5.15 -.25 -3.11
  [3,0,4.23,-.25,-2.38,3.43,-.25,-3.46,5.15,-.25,-3.11],
// 3 0 4.67 -.25 -.97 5.38 -.25 -2.88 5.7 -.25 -2.79
  [3,0,4.67,-.25,-.97,5.38,-.25,-2.88,5.7,-.25,-2.79],
// 3 0 5.38 -.25 -3.98 2.39 -.25 -4.06 5.7 -.25 -4.06
  [3,0,5.38,-.25,-3.98,2.39,-.25,-4.06,5.7,-.25,-4.06],
// 3 0 5.15 -.25 -3.75 2.39 -.25 -4.06 5.38 -.25 -3.98
  [3,0,5.15,-.25,-3.75,2.39,-.25,-4.06,5.38,-.25,-3.98],
// 3 0 7.71 -.25 -4.06 5.7 -.25 -4.06 0 -.25 -5.81
  [3,0,7.71,-.25,-4.06,5.7,-.25,-4.06,0,-.25,-5.81],
// 3 0 5.7 -.25 -4.06 2.39 -.25 -4.06 0 -.25 -5.81
  [3,0,5.7,-.25,-4.06,2.39,-.25,-4.06,0,-.25,-5.81],
// 3 0 12.82 -.25 -4.06 7.71 -.25 -4.06 0 -.25 -5.81
  [3,0,12.82,-.25,-4.06,7.71,-.25,-4.06,0,-.25,-5.81],
// 4 0 -22.88 -.25 3.69 -25.74 -.25 5.81 -26.12 -.25 5.74 -26.43 -.25 5.52
  [4,0,-22.88,-.25,3.69,-25.74,-.25,5.81,-26.12,-.25,5.74,-26.43,-.25,5.52],
// 4 0 -22.88 -.25 3.69 -26.43 -.25 5.52 -26.65 -.25 5.21 -26.72 -.25 4.83
  [4,0,-22.88,-.25,3.69,-26.43,-.25,5.52,-26.65,-.25,5.21,-26.72,-.25,4.83],
// 4 0 -22.88 -.25 3.69 -26.72 -.25 4.83 -26.72 -.25 -4.83 -22.88 -.25 -4.06
  [4,0,-22.88,-.25,3.69,-26.72,-.25,4.83,-26.72,-.25,-4.83,-22.88,-.25,-4.06],
// 4 0 -22.88 -.25 -4.06 -26.72 -.25 -4.83 -26.65 -.25 -5.21 -26.43 -.25 -5.52
  [4,0,-22.88,-.25,-4.06,-26.72,-.25,-4.83,-26.65,-.25,-5.21,-26.43,-.25,-5.52],
// 3 0 -22.88 -.25 -4.06 -26.43 -.25 -5.52 -26.12 -.25 -5.74
  [3,0,-22.88,-.25,-4.06,-26.43,-.25,-5.52,-26.12,-.25,-5.74],
// 4 0 26.43 -.25 5.52 26.12 -.25 5.74 22.38 -.25 3.69 26.65 -.25 5.21
  [4,0,26.43,-.25,5.52,26.12,-.25,5.74,22.38,-.25,3.69,26.65,-.25,5.21],
// 4 0 26.72 -.25 -4.83 26.72 -.25 4.83 26.65 -.25 5.21 22.38 -.25 3.69
  [4,0,26.72,-.25,-4.83,26.72,-.25,4.83,26.65,-.25,5.21,22.38,-.25,3.69],
// 4 0 26.72 -.25 -4.83 22.38 -.25 3.69 22.38 -.25 -4.06 26.65 -.25 -5.21
  [4,0,26.72,-.25,-4.83,22.38,-.25,3.69,22.38,-.25,-4.06,26.65,-.25,-5.21],
// 4 0 26.43 -.25 -5.52 26.65 -.25 -5.21 22.38 -.25 -4.06 26.12 -.25 -5.74
  [4,0,26.43,-.25,-5.52,26.65,-.25,-5.21,22.38,-.25,-4.06,26.12,-.25,-5.74],
// 3 0 -15.57 -.25 3.69 -16.38 -.25 1.56 -16.14 -.25 .51
  [3,0,-15.57,-.25,3.69,-16.38,-.25,1.56,-16.14,-.25,.51],
// 3 0 13.09 -.25 3.69 12.01 -.25 3.25 12.42 -.25 2.84
  [3,0,13.09,-.25,3.69,12.01,-.25,3.25,12.42,-.25,2.84],
// 4 15 -26.72 -.25 4.83 -26.65 -.25 5.21 -26.99 -.25 5.35 -27.09 -.25 4.83
  [4,15,-26.72,-.25,4.83,-26.65,-.25,5.21,-26.99,-.25,5.35,-27.09,-.25,4.83],
// 4 15 -26.12 -.25 5.74 -25.74 -.25 5.81 -25.74 -.25 6.18 -26.26 -.25 6.08
  [4,15,-26.12,-.25,5.74,-25.74,-.25,5.81,-25.74,-.25,6.18,-26.26,-.25,6.08],
// 4 15 -26.43 -.25 5.52 -26.12 -.25 5.74 -26.26 -.25 6.08 -26.69 -.25 5.78
  [4,15,-26.43,-.25,5.52,-26.12,-.25,5.74,-26.26,-.25,6.08,-26.69,-.25,5.78],
// 4 15 -26.65 -.25 5.21 -26.43 -.25 5.52 -26.69 -.25 5.78 -26.99 -.25 5.35
  [4,15,-26.65,-.25,5.21,-26.43,-.25,5.52,-26.69,-.25,5.78,-26.99,-.25,5.35],
// 4 15 25.74 -.25 5.81 25.74 -.25 6.18 -25.74 -.25 6.18 0 -.25 5.81
  [4,15,25.74,-.25,5.81,25.74,-.25,6.18,-25.74,-.25,6.18,0,-.25,5.81],
// 3 15 -25.74 -.25 5.81 0 -.25 5.81 -25.74 -.25 6.18
  [3,15,-25.74,-.25,5.81,0,-.25,5.81,-25.74,-.25,6.18],
// 4 15 26.12 -.25 5.74 26.26 -.25 6.08 25.74 -.25 6.18 25.74 -.25 5.81
  [4,15,26.12,-.25,5.74,26.26,-.25,6.08,25.74,-.25,6.18,25.74,-.25,5.81],
// 4 15 26.65 -.25 5.21 26.72 -.25 4.83 27.09 -.25 4.83 26.99 -.25 5.35
  [4,15,26.65,-.25,5.21,26.72,-.25,4.83,27.09,-.25,4.83,26.99,-.25,5.35],
// 4 15 26.43 -.25 5.52 26.65 -.25 5.21 26.99 -.25 5.35 26.69 -.25 5.78
  [4,15,26.43,-.25,5.52,26.65,-.25,5.21,26.99,-.25,5.35,26.69,-.25,5.78],
// 4 15 26.12 -.25 5.74 26.43 -.25 5.52 26.69 -.25 5.78 26.26 -.25 6.08
  [4,15,26.12,-.25,5.74,26.43,-.25,5.52,26.69,-.25,5.78,26.26,-.25,6.08],
// 4 15 26.12 -.25 -5.74 25.74 -.25 -5.81 25.74 -.25 -6.18 26.26 -.25 -6.08
  [4,15,26.12,-.25,-5.74,25.74,-.25,-5.81,25.74,-.25,-6.18,26.26,-.25,-6.08],
// 4 15 26.43 -.25 -5.52 26.12 -.25 -5.74 26.26 -.25 -6.08 26.69 -.25 -5.78
  [4,15,26.43,-.25,-5.52,26.12,-.25,-5.74,26.26,-.25,-6.08,26.69,-.25,-5.78],
// 4 15 26.65 -.25 -5.21 26.43 -.25 -5.52 26.69 -.25 -5.78 26.99 -.25 -5.35
  [4,15,26.65,-.25,-5.21,26.43,-.25,-5.52,26.69,-.25,-5.78,26.99,-.25,-5.35],
// 4 15 26.72 -.25 -4.83 26.65 -.25 -5.21 26.99 -.25 -5.35 27.09 -.25 -4.83
  [4,15,26.72,-.25,-4.83,26.65,-.25,-5.21,26.99,-.25,-5.35,27.09,-.25,-4.83],
// 4 15 -26.65 -.25 -5.21 -26.72 -.25 -4.83 -27.09 -.25 -4.83 -26.99 -.25 -5.35
  [4,15,-26.65,-.25,-5.21,-26.72,-.25,-4.83,-27.09,-.25,-4.83,-26.99,-.25,-5.35],
// 4 15 -26.43 -.25 -5.52 -26.65 -.25 -5.21 -26.99 -.25 -5.35 -26.69 -.25 -5.78
  [4,15,-26.43,-.25,-5.52,-26.65,-.25,-5.21,-26.99,-.25,-5.35,-26.69,-.25,-5.78],
// 4 15 -26.12 -.25 -5.74 -26.43 -.25 -5.52 -26.69 -.25 -5.78 -26.26 -.25 -6.08
  [4,15,-26.12,-.25,-5.74,-26.43,-.25,-5.52,-26.69,-.25,-5.78,-26.26,-.25,-6.08],
// 4 15 -25.74 -.25 -5.81 -26.12 -.25 -5.74 -26.26 -.25 -6.08 -25.74 -.25 -6.18
  [4,15,-25.74,-.25,-5.81,-26.12,-.25,-5.74,-26.26,-.25,-6.08,-25.74,-.25,-6.18],
// 3 15 0 -.25 -5.81 -25.74 -.25 -5.81 -25.74 -.25 -6.18
  [3,15,0,-.25,-5.81,-25.74,-.25,-5.81,-25.74,-.25,-6.18],
// 4 15 -25.74 -.25 -6.18 25.74 -.25 -6.18 25.74 -.25 -5.81 0 -.25 -5.81
  [4,15,-25.74,-.25,-6.18,25.74,-.25,-6.18,25.74,-.25,-5.81,0,-.25,-5.81],
// 4 15 -27.09 -.25 4.83 -27.09 -.25 -4.83 -26.72 -.25 -4.83 -26.72 -.25 4.83
  [4,15,-27.09,-.25,4.83,-27.09,-.25,-4.83,-26.72,-.25,-4.83,-26.72,-.25,4.83],
// 4 15 26.72 -.25 4.83 26.72 -.25 -4.83 27.09 -.25 -4.83 27.09 -.25 4.83
  [4,15,26.72,-.25,4.83,26.72,-.25,-4.83,27.09,-.25,-4.83,27.09,-.25,4.83],
// 4 15 22.38 -.25 3.69 21.43 -.25 3.69 21.1 -.25 3.41 20.86 -.25 1.79
  [4,15,22.38,-.25,3.69,21.43,-.25,3.69,21.1,-.25,3.41,20.86,-.25,1.79],
// 3 15 -16.71 -.25 2.21 -17.36 -.25 2.94 -18.33 -.25 1.4
  [3,15,-16.71,-.25,2.21,-17.36,-.25,2.94,-18.33,-.25,1.4],
// 4 15 -18.01 -.25 .59 -16.38 -.25 1.56 -16.71 -.25 2.21 -18.33 -.25 1.4
  [4,15,-18.01,-.25,.59,-16.38,-.25,1.56,-16.71,-.25,2.21,-18.33,-.25,1.4],
// 4 15 -12.43 -.25 -.08 -9.76 -.25 3.69 -11.87 -.25 3.69 -13.81 -.25 .53
  [4,15,-12.43,-.25,-.08,-9.76,-.25,3.69,-11.87,-.25,3.69,-13.81,-.25,.53],
// 4 15 20.78 -.25 1.79 20.45 -.25 3.04 19.8 -.25 2.76 20.3 -.25 1.48
  [4,15,20.78,-.25,1.79,20.45,-.25,3.04,19.8,-.25,2.76,20.3,-.25,1.48],
// 4 15 20.86 -.25 1.79 21.1 -.25 3.41 20.45 -.25 3.04 20.78 -.25 1.79
  [4,15,20.86,-.25,1.79,21.1,-.25,3.41,20.45,-.25,3.04,20.78,-.25,1.79],
// 4 15 20.86 -.25 1.79 20.86 -.25 -4.06 22.38 -.25 -4.06 22.38 -.25 3.69
  [4,15,20.86,-.25,1.79,20.86,-.25,-4.06,22.38,-.25,-4.06,22.38,-.25,3.69],
// 4 15 12.82 -.25 -4.06 12.82 -.25 -2.68 9.57 -.25 -2.68 7.71 -.25 -4.06
  [4,15,12.82,-.25,-4.06,12.82,-.25,-2.68,9.57,-.25,-2.68,7.71,-.25,-4.06],
// 4 15 19.24 -.25 2.6 19.83 -.25 1.27 20.3 -.25 1.48 19.8 -.25 2.76
  [4,15,19.24,-.25,2.6,19.83,-.25,1.27,20.3,-.25,1.48,19.8,-.25,2.76],
// 3 15 19.24 -.25 2.6 19.24 -.25 1.14 19.83 -.25 1.27
  [3,15,19.24,-.25,2.6,19.24,-.25,1.14,19.83,-.25,1.27],
// 4 15 13.09 -.25 2.32 16.58 -.25 2.33 18.44 -.25 3.69 13.09 -.25 3.69
  [4,15,13.09,-.25,2.32,16.58,-.25,2.33,18.44,-.25,3.69,13.09,-.25,3.69],
// 4 15 3.43 -.25 3.05 2.39 -.25 3.69 2.13 -.25 2.33 2.69 -.25 1.94
  [4,15,3.43,-.25,3.05,2.39,-.25,3.69,2.13,-.25,2.33,2.69,-.25,1.94],
// 4 15 8.92 -.25 -1.06 9.9 -.25 -2.03 11.76 -.25 -.65 10.63 -.25 .24
  [4,15,8.92,-.25,-1.06,9.9,-.25,-2.03,11.76,-.25,-.65,10.63,-.25,.24],
// 4 15 12.41 -.25 .08 11.03 -.25 .89 10.63 -.25 .24 11.76 -.25 -.65
  [4,15,12.41,-.25,.08,11.03,-.25,.89,10.63,-.25,.24,11.76,-.25,-.65],
// 4 15 1.52 -.25 -2.74 .98 -.25 -2.36 .22 -.25 -3.46 1.26 -.25 -4.06
  [4,15,1.52,-.25,-2.74,.98,-.25,-2.36,.22,-.25,-3.46,1.26,-.25,-4.06],
// 4 15 9.9 -.25 -2.03 8.92 -.25 -1.06 8.27 -.25 -1.79 9.57 -.25 -2.52
  [4,15,9.9,-.25,-2.03,8.92,-.25,-1.06,8.27,-.25,-1.79,9.57,-.25,-2.52],
// 4 15 2.69 -.25 -2.36 2.13 -.25 -2.74 2.39 -.25 -4.06 3.43 -.25 -3.46
  [4,15,2.69,-.25,-2.36,2.13,-.25,-2.74,2.39,-.25,-4.06,3.43,-.25,-3.46],
// 4 15 4.23 -.25 1.97 3.11 -.25 1.23 3.33 -.25 .3 4.67 -.25 .56
  [4,15,4.23,-.25,1.97,3.11,-.25,1.23,3.33,-.25,.3,4.67,-.25,.56],
// 4 15 3.33 -.25 -.71 4.67 -.25 -.97 4.67 -.25 .56 3.33 -.25 .3
  [4,15,3.33,-.25,-.71,4.67,-.25,-.97,4.67,-.25,.56,3.33,-.25,.3],
// 4 15 2.39 -.25 3.69 1.26 -.25 3.69 1.52 -.25 2.33 2.13 -.25 2.33
  [4,15,2.39,-.25,3.69,1.26,-.25,3.69,1.52,-.25,2.33,2.13,-.25,2.33],
// 4 15 9 -.25 2.19 9.9 -.25 2.35 9.57 -.25 3.65 8.84 -.25 3.46
  [4,15,9,-.25,2.19,9.9,-.25,2.35,9.57,-.25,3.65,8.84,-.25,3.46],
// 4 15 12.01 -.25 3.25 11.28 -.25 3.57 10.95 -.25 2.03 12.42 -.25 2.84
  [4,15,12.01,-.25,3.25,11.28,-.25,3.57,10.95,-.25,2.03,12.42,-.25,2.84],
// 4 15 12.42 -.25 2.84 10.95 -.25 2.03 11.11 -.25 1.46 12.74 -.25 2.19
  [4,15,12.42,-.25,2.84,10.95,-.25,2.03,11.11,-.25,1.46,12.74,-.25,2.19],
// 4 15 9.57 -.25 -2.68 9.57 -.25 -2.52 8.27 -.25 -1.79 7.79 -.25 -2.84
  [4,15,9.57,-.25,-2.68,9.57,-.25,-2.52,8.27,-.25,-1.79,7.79,-.25,-2.84],
// 4 15 16.5 -.25 -1.32 15.12 -.25 -.59 14.55 -.25 -2.27 16.09 -.25 -3
  [4,15,16.5,-.25,-1.32,15.12,-.25,-.59,14.55,-.25,-2.27,16.09,-.25,-3],
// 4 15 16.09 -.25 -3 14.55 -.25 -2.27 14.22 -.25 -3.65 15.93 -.25 -4.06
  [4,15,16.09,-.25,-3,14.55,-.25,-2.27,14.22,-.25,-3.65,15.93,-.25,-4.06],
// 3 15 9.57 -.25 -2.68 7.79 -.25 -2.84 7.71 -.25 -4.06
  [3,15,9.57,-.25,-2.68,7.79,-.25,-2.84,7.71,-.25,-4.06],
// 4 15 12.41 -.25 .08 12.74 -.25 .81 11.11 -.25 1.46 11.03 -.25 .89
  [4,15,12.41,-.25,.08,12.74,-.25,.81,11.11,-.25,1.46,11.03,-.25,.89],
// 4 15 12.74 -.25 2.19 11.11 -.25 1.46 12.74 -.25 .81 12.84 -.25 1.5
  [4,15,12.74,-.25,2.19,11.11,-.25,1.46,12.74,-.25,.81,12.84,-.25,1.5],
// 4 15 10.43 -.25 3.69 10.55 -.25 2.27 10.95 -.25 2.03 11.28 -.25 3.57
  [4,15,10.43,-.25,3.69,10.55,-.25,2.27,10.95,-.25,2.03,11.28,-.25,3.57],
// 4 15 9.57 -.25 3.65 9.9 -.25 2.35 10.55 -.25 2.27 10.43 -.25 3.69
  [4,15,9.57,-.25,3.65,9.9,-.25,2.35,10.55,-.25,2.27,10.43,-.25,3.69],
// 4 15 8.11 -.25 1.62 9 -.25 2.19 8.84 -.25 3.46 8.11 -.25 3.08
  [4,15,8.11,-.25,1.62,9,-.25,2.19,8.84,-.25,3.46,8.11,-.25,3.08],
// 4 15 -12.43 -.25 -.08 -13.8 -.25 -.95 -11.78 -.25 -4.06 -9.59 -.25 -4.06
  [4,15,-12.43,-.25,-.08,-13.8,-.25,-.95,-11.78,-.25,-4.06,-9.59,-.25,-4.06],
// 3 15 -16.14 -.25 .51 -16.38 -.25 1.56 -18.01 -.25 .59
  [3,15,-16.14,-.25,.51,-16.38,-.25,1.56,-18.01,-.25,.59],
// 4 15 -18.01 -.25 -.81 -16.14 -.25 -.65 -16.14 -.25 .51 -18.01 -.25 .59
  [4,15,-18.01,-.25,-.81,-16.14,-.25,-.65,-16.14,-.25,.51,-18.01,-.25,.59],
// 4 15 -19.63 -.25 2.21 -18.9 -.25 1.89 -18.17 -.25 3.45 -18.98 -.25 3.69
  [4,15,-19.63,-.25,2.21,-18.9,-.25,1.89,-18.17,-.25,3.45,-18.98,-.25,3.69],
// 4 15 -15.57 -.25 -4.06 -13.81 -.25 .53 -13.79 -.25 3.69 -15.57 -.25 3.69
  [4,15,-15.57,-.25,-4.06,-13.81,-.25,.53,-13.79,-.25,3.69,-15.57,-.25,3.69],
// 3 15 -18.58 -.25 -3.81 -17.6 -.25 -3.33 -18.74 -.25 -2.11
  [3,15,-18.58,-.25,-3.81,-17.6,-.25,-3.33,-18.74,-.25,-2.11],
// 4 15 -13.8 -.25 -.95 -13.81 -.25 .53 -15.57 -.25 -4.06 -13.79 -.25 -4.06
  [4,15,-13.8,-.25,-.95,-13.81,-.25,.53,-15.57,-.25,-4.06,-13.79,-.25,-4.06],
// 4 15 -18.01 -.25 -.81 -18.17 -.25 -1.46 -16.79 -.25 -2.52 -16.38 -.25 -1.7
  [4,15,-18.01,-.25,-.81,-18.17,-.25,-1.46,-16.79,-.25,-2.52,-16.38,-.25,-1.7],
// 4 15 -18.98 -.25 3.69 -22.88 -.25 3.69 -21.17 -.25 2.29 -19.63 -.25 2.21
  [4,15,-18.98,-.25,3.69,-22.88,-.25,3.69,-21.17,-.25,2.29,-19.63,-.25,2.21],
// 3 15 -13.81 -.25 .53 -13.8 -.25 -.95 -12.43 -.25 -.08
  [3,15,-13.81,-.25,.53,-13.8,-.25,-.95,-12.43,-.25,-.08],
// 4 15 15.77 -.25 .79 17.14 -.25 .3 18.44 -.25 2.82 16.58 -.25 2.25
  [4,15,15.77,-.25,.79,17.14,-.25,.3,18.44,-.25,2.82,16.58,-.25,2.25],
// 3 15 14.22 -.25 -3.65 14.14 -.25 -4.06 15.93 -.25 -4.06
  [3,15,14.22,-.25,-3.65,14.14,-.25,-4.06,15.93,-.25,-4.06],
// 4 15 15.77 -.25 .79 15.12 -.25 -.59 16.5 -.25 -1.32 17.14 -.25 .3
  [4,15,15.77,-.25,.79,15.12,-.25,-.59,16.5,-.25,-1.32,17.14,-.25,.3],
// 4 15 16.58 -.25 2.25 18.44 -.25 2.82 18.44 -.25 3.69 16.58 -.25 2.33
  [4,15,16.58,-.25,2.25,18.44,-.25,2.82,18.44,-.25,3.69,16.58,-.25,2.33],
// 4 15 1.52 -.25 2.33 1.26 -.25 3.69 .22 -.25 3.05 .98 -.25 1.94
  [4,15,1.52,-.25,2.33,1.26,-.25,3.69,.22,-.25,3.05,.98,-.25,1.94],
// 4 15 3.43 -.25 3.05 2.69 -.25 1.94 3.11 -.25 1.23 4.23 -.25 1.97
  [4,15,3.43,-.25,3.05,2.69,-.25,1.94,3.11,-.25,1.23,4.23,-.25,1.97],
// 4 15 3.11 -.25 -1.64 4.23 -.25 -2.38 4.67 -.25 -.97 3.33 -.25 -.71
  [4,15,3.11,-.25,-1.64,4.23,-.25,-2.38,4.67,-.25,-.97,3.33,-.25,-.71],
// 4 15 .32 -.25 -.71 .32 -.25 .3 -1.01 -.25 .56 -1.01 -.25 -.97
  [4,15,.32,-.25,-.71,.32,-.25,.3,-1.01,-.25,.56,-1.01,-.25,-.97],
// 4 15 3.43 -.25 -3.46 4.23 -.25 -2.38 3.11 -.25 -1.64 2.69 -.25 -2.36
  [4,15,3.43,-.25,-3.46,4.23,-.25,-2.38,3.11,-.25,-1.64,2.69,-.25,-2.36],
// 4 15 1.26 -.25 -4.06 2.39 -.25 -4.06 2.13 -.25 -2.74 1.52 -.25 -2.74
  [4,15,1.26,-.25,-4.06,2.39,-.25,-4.06,2.13,-.25,-2.74,1.52,-.25,-2.74],
// 4 15 .54 -.25 -1.64 -.58 -.25 -2.38 .22 -.25 -3.46 .98 -.25 -2.36
  [4,15,.54,-.25,-1.64,-.58,-.25,-2.38,.22,-.25,-3.46,.98,-.25,-2.36],
// 4 15 -1.01 -.25 -.97 -.58 -.25 -2.38 .54 -.25 -1.64 .32 -.25 -.71
  [4,15,-1.01,-.25,-.97,-.58,-.25,-2.38,.54,-.25,-1.64,.32,-.25,-.71],
// 4 15 .22 -.25 3.05 -.58 -.25 1.97 .54 -.25 1.23 .98 -.25 1.94
  [4,15,.22,-.25,3.05,-.58,-.25,1.97,.54,-.25,1.23,.98,-.25,1.94],
// 4 15 -.58 -.25 1.97 -1.01 -.25 .56 .32 -.25 .3 .54 -.25 1.23
  [4,15,-.58,-.25,1.97,-1.01,-.25,.56,.32,-.25,.3,.54,-.25,1.23],
// 4 15 -18.17 -.25 3.45 -18.9 -.25 1.89 -18.33 -.25 1.4 -17.36 -.25 2.94
  [4,15,-18.17,-.25,3.45,-18.9,-.25,1.89,-18.33,-.25,1.4,-17.36,-.25,2.94],
// 3 15 -18.01 -.25 -.81 -16.38 -.25 -1.7 -16.14 -.25 -.65
  [3,15,-18.01,-.25,-.81,-16.38,-.25,-1.7,-16.14,-.25,-.65],
// 4 15 -16.79 -.25 -2.52 -18.17 -.25 -1.46 -18.74 -.25 -2.11 -17.6 -.25 -3.33
  [4,15,-16.79,-.25,-2.52,-18.17,-.25,-1.46,-18.74,-.25,-2.11,-17.6,-.25,-3.33],
// 4 15 -18.58 -.25 -3.81 -18.74 -.25 -2.11 -19.63 -.25 -2.6 -19.63 -.25 -4.06
  [4,15,-18.58,-.25,-3.81,-18.74,-.25,-2.11,-19.63,-.25,-2.6,-19.63,-.25,-4.06],
// 4 15 -21.17 -.25 -2.68 -22.88 -.25 -4.06 -19.63 -.25 -4.06 -19.63 -.25 -2.6
  [4,15,-21.17,-.25,-2.68,-22.88,-.25,-4.06,-19.63,-.25,-4.06,-19.63,-.25,-2.6],
// 4 15 -22.88 -.25 3.69 -22.88 -.25 -4.06 -21.17 -.25 -2.68 -21.17 -.25 2.29
  [4,15,-22.88,-.25,3.69,-22.88,-.25,-4.06,-21.17,-.25,-2.68,-21.17,-.25,2.29],
// 4 15 5.7 -.25 -3.43 5.15 -.25 -3.11 5.07 -.25 -3.43 5.15 -.25 -3.75
  [4,15,5.7,-.25,-3.43,5.15,-.25,-3.11,5.07,-.25,-3.43,5.15,-.25,-3.75],
// 4 15 5.7 -.25 -3.43 5.15 -.25 -3.75 5.38 -.25 -3.98 5.7 -.25 -4.06
  [4,15,5.7,-.25,-3.43,5.15,-.25,-3.75,5.38,-.25,-3.98,5.7,-.25,-4.06],
// 4 15 5.7 -.25 -3.43 5.7 -.25 -4.06 6.02 -.25 -3.98 6.25 -.25 -3.75
  [4,15,5.7,-.25,-3.43,5.7,-.25,-4.06,6.02,-.25,-3.98,6.25,-.25,-3.75],
// 4 15 5.7 -.25 -3.43 6.25 -.25 -3.75 6.33 -.25 -3.43 6.25 -.25 -3.11
  [4,15,5.7,-.25,-3.43,6.25,-.25,-3.75,6.33,-.25,-3.43,6.25,-.25,-3.11],
// 4 15 5.7 -.25 -3.43 6.25 -.25 -3.11 6.02 -.25 -2.88 5.7 -.25 -2.79
  [4,15,5.7,-.25,-3.43,6.25,-.25,-3.11,6.02,-.25,-2.88,5.7,-.25,-2.79],
// 4 15 5.7 -.25 -3.43 5.7 -.25 -2.79 5.38 -.25 -2.88 5.15 -.25 -3.11
  [4,15,5.7,-.25,-3.43,5.7,-.25,-2.79,5.38,-.25,-2.88,5.15,-.25,-3.11],
// 4 15 -2.72 -.25 3.69 -3.67 -.25 3.69 -4 -.25 3.41 -4.24 -.25 1.79
  [4,15,-2.72,-.25,3.69,-3.67,-.25,3.69,-4,-.25,3.41,-4.24,-.25,1.79],
// 4 15 -4.32 -.25 1.79 -4.65 -.25 3.04 -5.3 -.25 2.76 -4.8 -.25 1.48
  [4,15,-4.32,-.25,1.79,-4.65,-.25,3.04,-5.3,-.25,2.76,-4.8,-.25,1.48],
// 4 15 -4.24 -.25 1.79 -4 -.25 3.41 -4.65 -.25 3.04 -4.32 -.25 1.79
  [4,15,-4.24,-.25,1.79,-4,-.25,3.41,-4.65,-.25,3.04,-4.32,-.25,1.79],
// 4 15 -4.24 -.25 1.79 -4.24 -.25 -4.06 -2.72 -.25 -4.06 -2.72 -.25 3.69
  [4,15,-4.24,-.25,1.79,-4.24,-.25,-4.06,-2.72,-.25,-4.06,-2.72,-.25,3.69],
// 4 15 -5.86 -.25 2.6 -5.27 -.25 1.27 -4.8 -.25 1.48 -5.3 -.25 2.76
  [4,15,-5.86,-.25,2.6,-5.27,-.25,1.27,-4.8,-.25,1.48,-5.3,-.25,2.76],
// 3 15 -5.86 -.25 2.6 -5.86 -.25 1.14 -5.27 -.25 1.27
  [3,15,-5.86,-.25,2.6,-5.86,-.25,1.14,-5.27,-.25,1.27],
];
makepoly(ldraw_lib__6296256j(), line=0.2);
